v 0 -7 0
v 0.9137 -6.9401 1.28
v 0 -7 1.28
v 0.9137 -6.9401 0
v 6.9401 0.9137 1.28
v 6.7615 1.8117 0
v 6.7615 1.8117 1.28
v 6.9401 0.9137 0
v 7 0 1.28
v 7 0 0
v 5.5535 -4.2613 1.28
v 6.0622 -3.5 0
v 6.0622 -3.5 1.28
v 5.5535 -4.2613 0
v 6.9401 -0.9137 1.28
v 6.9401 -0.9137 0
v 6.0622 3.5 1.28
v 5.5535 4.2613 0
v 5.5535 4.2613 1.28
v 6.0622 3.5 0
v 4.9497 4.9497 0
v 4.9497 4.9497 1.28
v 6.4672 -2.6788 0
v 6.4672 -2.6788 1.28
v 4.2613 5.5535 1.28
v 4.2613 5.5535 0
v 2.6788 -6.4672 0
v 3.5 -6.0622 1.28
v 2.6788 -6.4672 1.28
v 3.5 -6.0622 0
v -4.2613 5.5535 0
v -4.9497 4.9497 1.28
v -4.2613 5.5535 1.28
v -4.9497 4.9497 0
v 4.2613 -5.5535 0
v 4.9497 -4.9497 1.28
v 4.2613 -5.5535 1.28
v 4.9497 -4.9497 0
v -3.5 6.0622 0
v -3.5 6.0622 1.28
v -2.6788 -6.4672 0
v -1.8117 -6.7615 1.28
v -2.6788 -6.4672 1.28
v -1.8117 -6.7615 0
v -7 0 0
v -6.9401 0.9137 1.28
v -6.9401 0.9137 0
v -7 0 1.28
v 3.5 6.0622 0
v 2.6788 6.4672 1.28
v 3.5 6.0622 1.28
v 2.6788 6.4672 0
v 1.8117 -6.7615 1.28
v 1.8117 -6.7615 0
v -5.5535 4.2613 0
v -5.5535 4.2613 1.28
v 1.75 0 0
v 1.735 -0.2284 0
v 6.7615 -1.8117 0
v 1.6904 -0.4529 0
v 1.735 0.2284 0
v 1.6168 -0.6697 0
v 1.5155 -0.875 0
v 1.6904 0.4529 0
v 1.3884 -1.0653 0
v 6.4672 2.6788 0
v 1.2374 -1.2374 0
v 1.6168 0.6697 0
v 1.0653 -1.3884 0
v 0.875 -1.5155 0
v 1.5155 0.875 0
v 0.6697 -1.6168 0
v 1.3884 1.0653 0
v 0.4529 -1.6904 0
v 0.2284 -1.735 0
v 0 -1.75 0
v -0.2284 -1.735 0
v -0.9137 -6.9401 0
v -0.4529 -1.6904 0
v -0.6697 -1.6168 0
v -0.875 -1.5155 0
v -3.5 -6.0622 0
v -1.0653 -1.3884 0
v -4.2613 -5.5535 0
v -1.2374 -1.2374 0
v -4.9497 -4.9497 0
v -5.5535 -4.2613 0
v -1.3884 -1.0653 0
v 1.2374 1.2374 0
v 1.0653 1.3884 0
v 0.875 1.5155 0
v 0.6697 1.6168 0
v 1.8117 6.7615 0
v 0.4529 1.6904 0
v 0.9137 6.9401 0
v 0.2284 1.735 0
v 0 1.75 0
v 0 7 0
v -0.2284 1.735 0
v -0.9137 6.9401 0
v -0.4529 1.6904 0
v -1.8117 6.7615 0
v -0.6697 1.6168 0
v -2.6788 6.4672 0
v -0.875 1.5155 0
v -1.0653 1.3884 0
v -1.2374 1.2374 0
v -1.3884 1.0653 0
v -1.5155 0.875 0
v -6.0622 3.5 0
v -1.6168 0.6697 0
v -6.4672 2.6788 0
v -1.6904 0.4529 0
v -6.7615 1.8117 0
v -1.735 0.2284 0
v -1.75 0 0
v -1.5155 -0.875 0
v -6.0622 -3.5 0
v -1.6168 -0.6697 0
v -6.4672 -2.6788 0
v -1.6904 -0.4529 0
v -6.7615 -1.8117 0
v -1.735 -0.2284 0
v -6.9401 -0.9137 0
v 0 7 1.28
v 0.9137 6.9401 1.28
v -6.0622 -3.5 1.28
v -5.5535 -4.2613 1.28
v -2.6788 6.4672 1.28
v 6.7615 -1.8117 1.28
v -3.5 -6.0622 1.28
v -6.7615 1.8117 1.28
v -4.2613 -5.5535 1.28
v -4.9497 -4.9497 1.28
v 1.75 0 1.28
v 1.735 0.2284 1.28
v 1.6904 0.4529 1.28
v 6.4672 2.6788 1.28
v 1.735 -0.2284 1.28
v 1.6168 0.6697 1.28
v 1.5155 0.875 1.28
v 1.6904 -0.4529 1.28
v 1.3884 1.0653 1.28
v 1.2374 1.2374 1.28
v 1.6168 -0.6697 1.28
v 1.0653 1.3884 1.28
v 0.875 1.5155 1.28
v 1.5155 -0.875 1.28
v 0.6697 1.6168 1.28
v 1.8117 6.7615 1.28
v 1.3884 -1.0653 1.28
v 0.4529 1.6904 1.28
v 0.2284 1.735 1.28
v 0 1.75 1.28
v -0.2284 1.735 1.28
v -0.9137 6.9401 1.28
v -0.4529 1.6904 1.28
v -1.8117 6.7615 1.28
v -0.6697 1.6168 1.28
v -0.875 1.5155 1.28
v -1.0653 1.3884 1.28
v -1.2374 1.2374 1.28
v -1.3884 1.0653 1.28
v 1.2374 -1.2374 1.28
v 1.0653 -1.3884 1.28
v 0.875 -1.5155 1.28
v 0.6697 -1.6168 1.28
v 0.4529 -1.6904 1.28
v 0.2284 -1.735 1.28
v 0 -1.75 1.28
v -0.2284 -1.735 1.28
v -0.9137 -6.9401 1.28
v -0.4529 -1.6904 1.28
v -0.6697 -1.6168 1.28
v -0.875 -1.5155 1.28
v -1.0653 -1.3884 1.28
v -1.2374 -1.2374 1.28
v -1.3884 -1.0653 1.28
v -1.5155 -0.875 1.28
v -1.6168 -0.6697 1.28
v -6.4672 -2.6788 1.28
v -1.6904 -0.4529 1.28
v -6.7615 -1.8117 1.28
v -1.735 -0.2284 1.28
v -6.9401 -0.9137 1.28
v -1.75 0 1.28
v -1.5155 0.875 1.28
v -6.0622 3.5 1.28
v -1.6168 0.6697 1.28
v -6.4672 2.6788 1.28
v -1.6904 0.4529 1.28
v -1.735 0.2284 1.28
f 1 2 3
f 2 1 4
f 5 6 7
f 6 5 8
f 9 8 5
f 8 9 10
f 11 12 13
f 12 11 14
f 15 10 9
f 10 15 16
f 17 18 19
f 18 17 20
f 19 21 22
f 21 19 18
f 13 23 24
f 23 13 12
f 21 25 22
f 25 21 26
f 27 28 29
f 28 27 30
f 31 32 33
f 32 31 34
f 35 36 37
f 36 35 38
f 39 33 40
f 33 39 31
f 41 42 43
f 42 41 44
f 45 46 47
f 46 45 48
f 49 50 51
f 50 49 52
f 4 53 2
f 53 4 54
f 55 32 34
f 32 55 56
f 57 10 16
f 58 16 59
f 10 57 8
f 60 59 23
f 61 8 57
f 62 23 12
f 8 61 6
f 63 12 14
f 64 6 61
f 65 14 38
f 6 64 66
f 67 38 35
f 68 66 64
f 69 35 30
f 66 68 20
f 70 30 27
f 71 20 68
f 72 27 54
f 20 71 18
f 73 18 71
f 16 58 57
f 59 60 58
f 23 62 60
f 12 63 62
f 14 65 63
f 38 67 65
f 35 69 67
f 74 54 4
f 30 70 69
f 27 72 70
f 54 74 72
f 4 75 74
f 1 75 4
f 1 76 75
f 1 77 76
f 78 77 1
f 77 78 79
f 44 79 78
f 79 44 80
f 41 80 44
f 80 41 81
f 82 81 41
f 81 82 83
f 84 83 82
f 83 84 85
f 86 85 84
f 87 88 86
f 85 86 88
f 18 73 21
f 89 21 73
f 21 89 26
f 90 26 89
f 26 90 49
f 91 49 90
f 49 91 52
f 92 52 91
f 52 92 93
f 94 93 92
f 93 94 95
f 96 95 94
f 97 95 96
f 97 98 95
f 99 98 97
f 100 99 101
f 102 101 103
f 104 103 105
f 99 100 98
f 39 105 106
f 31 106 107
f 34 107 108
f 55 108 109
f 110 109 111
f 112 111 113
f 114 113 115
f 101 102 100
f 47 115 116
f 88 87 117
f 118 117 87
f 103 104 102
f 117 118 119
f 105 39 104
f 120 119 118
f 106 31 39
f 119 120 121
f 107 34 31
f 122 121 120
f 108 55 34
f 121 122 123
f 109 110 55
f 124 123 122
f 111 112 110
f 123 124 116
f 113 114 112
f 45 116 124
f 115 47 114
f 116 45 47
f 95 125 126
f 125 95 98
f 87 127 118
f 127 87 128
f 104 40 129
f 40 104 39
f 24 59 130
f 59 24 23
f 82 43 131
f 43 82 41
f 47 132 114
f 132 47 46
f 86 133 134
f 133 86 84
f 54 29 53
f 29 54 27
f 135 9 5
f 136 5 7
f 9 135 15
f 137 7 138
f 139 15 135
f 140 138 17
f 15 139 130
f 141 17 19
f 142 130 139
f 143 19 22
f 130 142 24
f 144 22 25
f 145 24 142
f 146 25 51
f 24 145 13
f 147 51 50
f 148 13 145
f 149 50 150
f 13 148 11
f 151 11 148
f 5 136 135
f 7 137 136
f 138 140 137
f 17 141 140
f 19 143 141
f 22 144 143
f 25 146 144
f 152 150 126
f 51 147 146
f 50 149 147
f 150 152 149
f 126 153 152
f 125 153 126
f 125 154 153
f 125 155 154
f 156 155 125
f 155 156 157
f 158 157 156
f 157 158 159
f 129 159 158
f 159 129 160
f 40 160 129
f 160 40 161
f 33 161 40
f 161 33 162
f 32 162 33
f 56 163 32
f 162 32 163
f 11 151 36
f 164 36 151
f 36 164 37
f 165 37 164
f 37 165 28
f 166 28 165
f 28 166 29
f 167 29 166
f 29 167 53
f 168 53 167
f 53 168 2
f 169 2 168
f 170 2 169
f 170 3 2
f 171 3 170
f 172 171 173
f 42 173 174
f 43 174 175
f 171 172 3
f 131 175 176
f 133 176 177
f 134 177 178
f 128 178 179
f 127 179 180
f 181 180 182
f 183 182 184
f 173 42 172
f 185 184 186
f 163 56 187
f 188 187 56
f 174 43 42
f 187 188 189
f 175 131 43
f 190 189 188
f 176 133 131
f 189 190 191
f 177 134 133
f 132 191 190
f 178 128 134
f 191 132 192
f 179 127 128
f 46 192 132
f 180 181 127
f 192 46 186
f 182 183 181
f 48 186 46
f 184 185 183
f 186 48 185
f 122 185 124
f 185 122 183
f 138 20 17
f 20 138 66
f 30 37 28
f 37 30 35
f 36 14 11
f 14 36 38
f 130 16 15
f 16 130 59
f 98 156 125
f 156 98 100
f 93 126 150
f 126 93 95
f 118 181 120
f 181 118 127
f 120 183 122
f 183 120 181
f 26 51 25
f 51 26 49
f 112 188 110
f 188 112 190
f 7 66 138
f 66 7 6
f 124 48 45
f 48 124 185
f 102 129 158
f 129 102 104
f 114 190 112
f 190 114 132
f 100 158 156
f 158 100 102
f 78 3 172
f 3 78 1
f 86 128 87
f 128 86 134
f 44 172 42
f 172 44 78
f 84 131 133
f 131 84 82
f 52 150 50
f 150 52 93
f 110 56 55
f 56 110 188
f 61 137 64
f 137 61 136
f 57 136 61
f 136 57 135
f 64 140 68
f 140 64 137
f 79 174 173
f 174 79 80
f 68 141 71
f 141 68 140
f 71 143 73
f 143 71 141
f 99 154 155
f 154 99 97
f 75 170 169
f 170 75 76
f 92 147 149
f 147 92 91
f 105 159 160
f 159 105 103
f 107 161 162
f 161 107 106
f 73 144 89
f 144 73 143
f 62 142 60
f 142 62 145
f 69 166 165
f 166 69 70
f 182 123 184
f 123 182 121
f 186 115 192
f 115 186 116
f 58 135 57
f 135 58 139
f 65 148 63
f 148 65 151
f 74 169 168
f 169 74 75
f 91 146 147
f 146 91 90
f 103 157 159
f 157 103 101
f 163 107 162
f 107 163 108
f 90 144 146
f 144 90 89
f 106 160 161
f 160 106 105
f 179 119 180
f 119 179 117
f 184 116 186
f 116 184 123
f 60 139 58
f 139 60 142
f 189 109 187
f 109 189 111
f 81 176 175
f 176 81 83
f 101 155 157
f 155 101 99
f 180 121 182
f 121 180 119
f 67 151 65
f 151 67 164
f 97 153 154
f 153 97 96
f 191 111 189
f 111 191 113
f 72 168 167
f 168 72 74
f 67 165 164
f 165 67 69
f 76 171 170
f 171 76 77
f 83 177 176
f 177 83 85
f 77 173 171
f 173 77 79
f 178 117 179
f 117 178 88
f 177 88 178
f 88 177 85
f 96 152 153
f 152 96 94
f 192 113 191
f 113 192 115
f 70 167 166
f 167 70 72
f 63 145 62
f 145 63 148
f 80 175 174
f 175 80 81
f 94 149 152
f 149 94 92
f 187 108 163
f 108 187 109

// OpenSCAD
// file: parameters.scad
// =============================================================================
// Gen-Z Dual-stator mid-rotor Halbach sandwich — WOUND-AWARE (HARD GATE)
// ONE mid rotor (magnets both faces) | TWO wound pancake stators | outer endbells
// =============================================================================

wire_awg            = 26;
wire_od             = 0.45;
turns               = 115;      // 9 coils/stator ×2 = 18 ×115 ×~0.11 ≈ 228 m
fill                = 0.70;
layers_per_face     = 2;
wind_build_axial    = layers_per_face * wire_od * fill;   // 0.63
wind_build_radial   = 2.8 * wire_od * fill;               // 0.882

coil_id_r           = 22.0;
coil_od_r           = 58.0;
span_deg            = 34.0;     // 9 stations × 40°
former_web          = 1.9;
flange_t            = 0.70;
wall                = 1.2;
slot_w              = 2.4;
mount_hole          = 3.5;
tab_len             = 7.0;

former_bare_h       = former_web + 2 * flange_t;            // 3.3
coil_envelope_h     = former_bare_h + 2 * wind_build_axial; // 4.56

run_clear           = 0.65;
gap_spacer_h        = run_clear + wind_build_axial;         // 1.28
m2m                 = coil_envelope_h + 2 * run_clear;      // 5.86 per gap

coil_stations       = 9;        // per stator; ×2 = 18 total
bay_r_in            = coil_id_r - 2.0 - wind_build_radial;
bay_r_out           = coil_od_r + 2.0 + wind_build_radial;
bay_span            = span_deg + 4.0;
bay_offset          = 2.0;
bay_depth           = former_bare_h + wind_build_axial;
stator_back_web     = 2.0;
stator_thick        = bay_depth + stator_back_web;
stator_od           = 156.0;
shaft_clear_stator  = 40.0;
coil_mount_r        = 30.0;

large_pocket_d      = 20.3;
small_pocket_d      = 5.3;
pocket_h            = 5.2;
large_n             = 8;
R_large             = 52.0;
R_small_inner       = 40.0;
R_small_mid         = 52.0;
R_small_outer       = 64.0;
carrier_od          = 152.0;
mid_carrier_thick   = 12.0;
hub_h               = 10.0;
hub_od              = 30.0;
rotor_b_offset_deg  = 22.5;

shaft_bore          = 8.35;
bearing_d           = 21.85;
bearing_h           = 7.2;
m3_clear            = 3.5;
bolt_r_inner        = 36.0;
bolt_n_inner        = 6;
flange_bolt_r       = 72.0;
flange_bolt_n       = 6;
brace_r             = 68.0;
brace_d             = 4.3;
brace_n             = 4;

spacer_pad_od       = 14.0;
spacer_pad_id       = m3_clear;
endbell_od          = 156.0;
endbell_thick       = 8.0;
endbell_shaft_clear = 10.0;

$fn = 64;
// main file
// Gen-Z gap spacer — h = run_clear + wind_build_axial; print ×18
include <parameters.scad>;
$fn = 48;
difference() {
    cylinder(d=spacer_pad_od, h=gap_spacer_h);
    translate([0, 0, -0.1]) cylinder(d=spacer_pad_id, h=gap_spacer_h + 0.2);
}
